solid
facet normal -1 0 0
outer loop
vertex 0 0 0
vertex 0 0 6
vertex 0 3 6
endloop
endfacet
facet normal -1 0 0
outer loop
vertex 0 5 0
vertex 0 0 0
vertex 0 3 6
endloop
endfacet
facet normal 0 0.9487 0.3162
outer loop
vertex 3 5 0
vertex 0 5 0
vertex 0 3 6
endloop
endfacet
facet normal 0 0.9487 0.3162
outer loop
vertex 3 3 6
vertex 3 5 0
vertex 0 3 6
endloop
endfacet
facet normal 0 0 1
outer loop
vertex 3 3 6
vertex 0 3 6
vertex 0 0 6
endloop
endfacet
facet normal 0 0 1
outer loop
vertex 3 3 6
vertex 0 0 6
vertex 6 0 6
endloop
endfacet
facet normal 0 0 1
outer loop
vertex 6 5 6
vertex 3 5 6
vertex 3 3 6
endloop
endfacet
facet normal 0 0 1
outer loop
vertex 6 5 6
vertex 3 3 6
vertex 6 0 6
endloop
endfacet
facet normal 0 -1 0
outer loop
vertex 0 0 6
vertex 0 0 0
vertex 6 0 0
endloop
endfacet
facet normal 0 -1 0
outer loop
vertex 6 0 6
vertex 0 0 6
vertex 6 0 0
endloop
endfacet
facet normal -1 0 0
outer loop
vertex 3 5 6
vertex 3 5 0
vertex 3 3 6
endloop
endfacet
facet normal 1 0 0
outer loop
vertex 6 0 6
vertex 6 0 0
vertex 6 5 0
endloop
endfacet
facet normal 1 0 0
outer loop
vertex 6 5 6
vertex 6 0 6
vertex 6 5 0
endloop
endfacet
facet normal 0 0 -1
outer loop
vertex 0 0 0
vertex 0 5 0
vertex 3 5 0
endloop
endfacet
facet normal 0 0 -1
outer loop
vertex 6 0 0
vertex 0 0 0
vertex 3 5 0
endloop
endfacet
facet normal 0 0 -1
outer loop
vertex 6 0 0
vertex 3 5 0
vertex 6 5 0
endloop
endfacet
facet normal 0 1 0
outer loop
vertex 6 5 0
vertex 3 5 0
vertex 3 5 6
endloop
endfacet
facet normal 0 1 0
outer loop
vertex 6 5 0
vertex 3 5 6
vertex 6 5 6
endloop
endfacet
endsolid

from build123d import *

# Parameters (mm, degrees)
SKETCH3_W           = 6
SKETCH3_H           = 5
BOSS_EXTRUDE6_DEPTH = 6
CUT_EXTRUDE3_DEPTH  = 3


with BuildPart() as part:
    # Sketch3 → Boss-Extrude6 (new body)
    with BuildSketch(Plane.XY):
        with Locations((3, 2.5)):
            Rectangle(SKETCH3_W, SKETCH3_H)
    extrude(amount=BOSS_EXTRUDE6_DEPTH)

    # Sketch7 → Cut-Extrude3 (cut)
    with BuildSketch(Plane.ZY):
        Polygon((0, 5), (6, 3), (6, 5), align=None)
    extrude(amount=-CUT_EXTRUDE3_DEPTH, mode=Mode.SUBTRACT)


solid = part.part
